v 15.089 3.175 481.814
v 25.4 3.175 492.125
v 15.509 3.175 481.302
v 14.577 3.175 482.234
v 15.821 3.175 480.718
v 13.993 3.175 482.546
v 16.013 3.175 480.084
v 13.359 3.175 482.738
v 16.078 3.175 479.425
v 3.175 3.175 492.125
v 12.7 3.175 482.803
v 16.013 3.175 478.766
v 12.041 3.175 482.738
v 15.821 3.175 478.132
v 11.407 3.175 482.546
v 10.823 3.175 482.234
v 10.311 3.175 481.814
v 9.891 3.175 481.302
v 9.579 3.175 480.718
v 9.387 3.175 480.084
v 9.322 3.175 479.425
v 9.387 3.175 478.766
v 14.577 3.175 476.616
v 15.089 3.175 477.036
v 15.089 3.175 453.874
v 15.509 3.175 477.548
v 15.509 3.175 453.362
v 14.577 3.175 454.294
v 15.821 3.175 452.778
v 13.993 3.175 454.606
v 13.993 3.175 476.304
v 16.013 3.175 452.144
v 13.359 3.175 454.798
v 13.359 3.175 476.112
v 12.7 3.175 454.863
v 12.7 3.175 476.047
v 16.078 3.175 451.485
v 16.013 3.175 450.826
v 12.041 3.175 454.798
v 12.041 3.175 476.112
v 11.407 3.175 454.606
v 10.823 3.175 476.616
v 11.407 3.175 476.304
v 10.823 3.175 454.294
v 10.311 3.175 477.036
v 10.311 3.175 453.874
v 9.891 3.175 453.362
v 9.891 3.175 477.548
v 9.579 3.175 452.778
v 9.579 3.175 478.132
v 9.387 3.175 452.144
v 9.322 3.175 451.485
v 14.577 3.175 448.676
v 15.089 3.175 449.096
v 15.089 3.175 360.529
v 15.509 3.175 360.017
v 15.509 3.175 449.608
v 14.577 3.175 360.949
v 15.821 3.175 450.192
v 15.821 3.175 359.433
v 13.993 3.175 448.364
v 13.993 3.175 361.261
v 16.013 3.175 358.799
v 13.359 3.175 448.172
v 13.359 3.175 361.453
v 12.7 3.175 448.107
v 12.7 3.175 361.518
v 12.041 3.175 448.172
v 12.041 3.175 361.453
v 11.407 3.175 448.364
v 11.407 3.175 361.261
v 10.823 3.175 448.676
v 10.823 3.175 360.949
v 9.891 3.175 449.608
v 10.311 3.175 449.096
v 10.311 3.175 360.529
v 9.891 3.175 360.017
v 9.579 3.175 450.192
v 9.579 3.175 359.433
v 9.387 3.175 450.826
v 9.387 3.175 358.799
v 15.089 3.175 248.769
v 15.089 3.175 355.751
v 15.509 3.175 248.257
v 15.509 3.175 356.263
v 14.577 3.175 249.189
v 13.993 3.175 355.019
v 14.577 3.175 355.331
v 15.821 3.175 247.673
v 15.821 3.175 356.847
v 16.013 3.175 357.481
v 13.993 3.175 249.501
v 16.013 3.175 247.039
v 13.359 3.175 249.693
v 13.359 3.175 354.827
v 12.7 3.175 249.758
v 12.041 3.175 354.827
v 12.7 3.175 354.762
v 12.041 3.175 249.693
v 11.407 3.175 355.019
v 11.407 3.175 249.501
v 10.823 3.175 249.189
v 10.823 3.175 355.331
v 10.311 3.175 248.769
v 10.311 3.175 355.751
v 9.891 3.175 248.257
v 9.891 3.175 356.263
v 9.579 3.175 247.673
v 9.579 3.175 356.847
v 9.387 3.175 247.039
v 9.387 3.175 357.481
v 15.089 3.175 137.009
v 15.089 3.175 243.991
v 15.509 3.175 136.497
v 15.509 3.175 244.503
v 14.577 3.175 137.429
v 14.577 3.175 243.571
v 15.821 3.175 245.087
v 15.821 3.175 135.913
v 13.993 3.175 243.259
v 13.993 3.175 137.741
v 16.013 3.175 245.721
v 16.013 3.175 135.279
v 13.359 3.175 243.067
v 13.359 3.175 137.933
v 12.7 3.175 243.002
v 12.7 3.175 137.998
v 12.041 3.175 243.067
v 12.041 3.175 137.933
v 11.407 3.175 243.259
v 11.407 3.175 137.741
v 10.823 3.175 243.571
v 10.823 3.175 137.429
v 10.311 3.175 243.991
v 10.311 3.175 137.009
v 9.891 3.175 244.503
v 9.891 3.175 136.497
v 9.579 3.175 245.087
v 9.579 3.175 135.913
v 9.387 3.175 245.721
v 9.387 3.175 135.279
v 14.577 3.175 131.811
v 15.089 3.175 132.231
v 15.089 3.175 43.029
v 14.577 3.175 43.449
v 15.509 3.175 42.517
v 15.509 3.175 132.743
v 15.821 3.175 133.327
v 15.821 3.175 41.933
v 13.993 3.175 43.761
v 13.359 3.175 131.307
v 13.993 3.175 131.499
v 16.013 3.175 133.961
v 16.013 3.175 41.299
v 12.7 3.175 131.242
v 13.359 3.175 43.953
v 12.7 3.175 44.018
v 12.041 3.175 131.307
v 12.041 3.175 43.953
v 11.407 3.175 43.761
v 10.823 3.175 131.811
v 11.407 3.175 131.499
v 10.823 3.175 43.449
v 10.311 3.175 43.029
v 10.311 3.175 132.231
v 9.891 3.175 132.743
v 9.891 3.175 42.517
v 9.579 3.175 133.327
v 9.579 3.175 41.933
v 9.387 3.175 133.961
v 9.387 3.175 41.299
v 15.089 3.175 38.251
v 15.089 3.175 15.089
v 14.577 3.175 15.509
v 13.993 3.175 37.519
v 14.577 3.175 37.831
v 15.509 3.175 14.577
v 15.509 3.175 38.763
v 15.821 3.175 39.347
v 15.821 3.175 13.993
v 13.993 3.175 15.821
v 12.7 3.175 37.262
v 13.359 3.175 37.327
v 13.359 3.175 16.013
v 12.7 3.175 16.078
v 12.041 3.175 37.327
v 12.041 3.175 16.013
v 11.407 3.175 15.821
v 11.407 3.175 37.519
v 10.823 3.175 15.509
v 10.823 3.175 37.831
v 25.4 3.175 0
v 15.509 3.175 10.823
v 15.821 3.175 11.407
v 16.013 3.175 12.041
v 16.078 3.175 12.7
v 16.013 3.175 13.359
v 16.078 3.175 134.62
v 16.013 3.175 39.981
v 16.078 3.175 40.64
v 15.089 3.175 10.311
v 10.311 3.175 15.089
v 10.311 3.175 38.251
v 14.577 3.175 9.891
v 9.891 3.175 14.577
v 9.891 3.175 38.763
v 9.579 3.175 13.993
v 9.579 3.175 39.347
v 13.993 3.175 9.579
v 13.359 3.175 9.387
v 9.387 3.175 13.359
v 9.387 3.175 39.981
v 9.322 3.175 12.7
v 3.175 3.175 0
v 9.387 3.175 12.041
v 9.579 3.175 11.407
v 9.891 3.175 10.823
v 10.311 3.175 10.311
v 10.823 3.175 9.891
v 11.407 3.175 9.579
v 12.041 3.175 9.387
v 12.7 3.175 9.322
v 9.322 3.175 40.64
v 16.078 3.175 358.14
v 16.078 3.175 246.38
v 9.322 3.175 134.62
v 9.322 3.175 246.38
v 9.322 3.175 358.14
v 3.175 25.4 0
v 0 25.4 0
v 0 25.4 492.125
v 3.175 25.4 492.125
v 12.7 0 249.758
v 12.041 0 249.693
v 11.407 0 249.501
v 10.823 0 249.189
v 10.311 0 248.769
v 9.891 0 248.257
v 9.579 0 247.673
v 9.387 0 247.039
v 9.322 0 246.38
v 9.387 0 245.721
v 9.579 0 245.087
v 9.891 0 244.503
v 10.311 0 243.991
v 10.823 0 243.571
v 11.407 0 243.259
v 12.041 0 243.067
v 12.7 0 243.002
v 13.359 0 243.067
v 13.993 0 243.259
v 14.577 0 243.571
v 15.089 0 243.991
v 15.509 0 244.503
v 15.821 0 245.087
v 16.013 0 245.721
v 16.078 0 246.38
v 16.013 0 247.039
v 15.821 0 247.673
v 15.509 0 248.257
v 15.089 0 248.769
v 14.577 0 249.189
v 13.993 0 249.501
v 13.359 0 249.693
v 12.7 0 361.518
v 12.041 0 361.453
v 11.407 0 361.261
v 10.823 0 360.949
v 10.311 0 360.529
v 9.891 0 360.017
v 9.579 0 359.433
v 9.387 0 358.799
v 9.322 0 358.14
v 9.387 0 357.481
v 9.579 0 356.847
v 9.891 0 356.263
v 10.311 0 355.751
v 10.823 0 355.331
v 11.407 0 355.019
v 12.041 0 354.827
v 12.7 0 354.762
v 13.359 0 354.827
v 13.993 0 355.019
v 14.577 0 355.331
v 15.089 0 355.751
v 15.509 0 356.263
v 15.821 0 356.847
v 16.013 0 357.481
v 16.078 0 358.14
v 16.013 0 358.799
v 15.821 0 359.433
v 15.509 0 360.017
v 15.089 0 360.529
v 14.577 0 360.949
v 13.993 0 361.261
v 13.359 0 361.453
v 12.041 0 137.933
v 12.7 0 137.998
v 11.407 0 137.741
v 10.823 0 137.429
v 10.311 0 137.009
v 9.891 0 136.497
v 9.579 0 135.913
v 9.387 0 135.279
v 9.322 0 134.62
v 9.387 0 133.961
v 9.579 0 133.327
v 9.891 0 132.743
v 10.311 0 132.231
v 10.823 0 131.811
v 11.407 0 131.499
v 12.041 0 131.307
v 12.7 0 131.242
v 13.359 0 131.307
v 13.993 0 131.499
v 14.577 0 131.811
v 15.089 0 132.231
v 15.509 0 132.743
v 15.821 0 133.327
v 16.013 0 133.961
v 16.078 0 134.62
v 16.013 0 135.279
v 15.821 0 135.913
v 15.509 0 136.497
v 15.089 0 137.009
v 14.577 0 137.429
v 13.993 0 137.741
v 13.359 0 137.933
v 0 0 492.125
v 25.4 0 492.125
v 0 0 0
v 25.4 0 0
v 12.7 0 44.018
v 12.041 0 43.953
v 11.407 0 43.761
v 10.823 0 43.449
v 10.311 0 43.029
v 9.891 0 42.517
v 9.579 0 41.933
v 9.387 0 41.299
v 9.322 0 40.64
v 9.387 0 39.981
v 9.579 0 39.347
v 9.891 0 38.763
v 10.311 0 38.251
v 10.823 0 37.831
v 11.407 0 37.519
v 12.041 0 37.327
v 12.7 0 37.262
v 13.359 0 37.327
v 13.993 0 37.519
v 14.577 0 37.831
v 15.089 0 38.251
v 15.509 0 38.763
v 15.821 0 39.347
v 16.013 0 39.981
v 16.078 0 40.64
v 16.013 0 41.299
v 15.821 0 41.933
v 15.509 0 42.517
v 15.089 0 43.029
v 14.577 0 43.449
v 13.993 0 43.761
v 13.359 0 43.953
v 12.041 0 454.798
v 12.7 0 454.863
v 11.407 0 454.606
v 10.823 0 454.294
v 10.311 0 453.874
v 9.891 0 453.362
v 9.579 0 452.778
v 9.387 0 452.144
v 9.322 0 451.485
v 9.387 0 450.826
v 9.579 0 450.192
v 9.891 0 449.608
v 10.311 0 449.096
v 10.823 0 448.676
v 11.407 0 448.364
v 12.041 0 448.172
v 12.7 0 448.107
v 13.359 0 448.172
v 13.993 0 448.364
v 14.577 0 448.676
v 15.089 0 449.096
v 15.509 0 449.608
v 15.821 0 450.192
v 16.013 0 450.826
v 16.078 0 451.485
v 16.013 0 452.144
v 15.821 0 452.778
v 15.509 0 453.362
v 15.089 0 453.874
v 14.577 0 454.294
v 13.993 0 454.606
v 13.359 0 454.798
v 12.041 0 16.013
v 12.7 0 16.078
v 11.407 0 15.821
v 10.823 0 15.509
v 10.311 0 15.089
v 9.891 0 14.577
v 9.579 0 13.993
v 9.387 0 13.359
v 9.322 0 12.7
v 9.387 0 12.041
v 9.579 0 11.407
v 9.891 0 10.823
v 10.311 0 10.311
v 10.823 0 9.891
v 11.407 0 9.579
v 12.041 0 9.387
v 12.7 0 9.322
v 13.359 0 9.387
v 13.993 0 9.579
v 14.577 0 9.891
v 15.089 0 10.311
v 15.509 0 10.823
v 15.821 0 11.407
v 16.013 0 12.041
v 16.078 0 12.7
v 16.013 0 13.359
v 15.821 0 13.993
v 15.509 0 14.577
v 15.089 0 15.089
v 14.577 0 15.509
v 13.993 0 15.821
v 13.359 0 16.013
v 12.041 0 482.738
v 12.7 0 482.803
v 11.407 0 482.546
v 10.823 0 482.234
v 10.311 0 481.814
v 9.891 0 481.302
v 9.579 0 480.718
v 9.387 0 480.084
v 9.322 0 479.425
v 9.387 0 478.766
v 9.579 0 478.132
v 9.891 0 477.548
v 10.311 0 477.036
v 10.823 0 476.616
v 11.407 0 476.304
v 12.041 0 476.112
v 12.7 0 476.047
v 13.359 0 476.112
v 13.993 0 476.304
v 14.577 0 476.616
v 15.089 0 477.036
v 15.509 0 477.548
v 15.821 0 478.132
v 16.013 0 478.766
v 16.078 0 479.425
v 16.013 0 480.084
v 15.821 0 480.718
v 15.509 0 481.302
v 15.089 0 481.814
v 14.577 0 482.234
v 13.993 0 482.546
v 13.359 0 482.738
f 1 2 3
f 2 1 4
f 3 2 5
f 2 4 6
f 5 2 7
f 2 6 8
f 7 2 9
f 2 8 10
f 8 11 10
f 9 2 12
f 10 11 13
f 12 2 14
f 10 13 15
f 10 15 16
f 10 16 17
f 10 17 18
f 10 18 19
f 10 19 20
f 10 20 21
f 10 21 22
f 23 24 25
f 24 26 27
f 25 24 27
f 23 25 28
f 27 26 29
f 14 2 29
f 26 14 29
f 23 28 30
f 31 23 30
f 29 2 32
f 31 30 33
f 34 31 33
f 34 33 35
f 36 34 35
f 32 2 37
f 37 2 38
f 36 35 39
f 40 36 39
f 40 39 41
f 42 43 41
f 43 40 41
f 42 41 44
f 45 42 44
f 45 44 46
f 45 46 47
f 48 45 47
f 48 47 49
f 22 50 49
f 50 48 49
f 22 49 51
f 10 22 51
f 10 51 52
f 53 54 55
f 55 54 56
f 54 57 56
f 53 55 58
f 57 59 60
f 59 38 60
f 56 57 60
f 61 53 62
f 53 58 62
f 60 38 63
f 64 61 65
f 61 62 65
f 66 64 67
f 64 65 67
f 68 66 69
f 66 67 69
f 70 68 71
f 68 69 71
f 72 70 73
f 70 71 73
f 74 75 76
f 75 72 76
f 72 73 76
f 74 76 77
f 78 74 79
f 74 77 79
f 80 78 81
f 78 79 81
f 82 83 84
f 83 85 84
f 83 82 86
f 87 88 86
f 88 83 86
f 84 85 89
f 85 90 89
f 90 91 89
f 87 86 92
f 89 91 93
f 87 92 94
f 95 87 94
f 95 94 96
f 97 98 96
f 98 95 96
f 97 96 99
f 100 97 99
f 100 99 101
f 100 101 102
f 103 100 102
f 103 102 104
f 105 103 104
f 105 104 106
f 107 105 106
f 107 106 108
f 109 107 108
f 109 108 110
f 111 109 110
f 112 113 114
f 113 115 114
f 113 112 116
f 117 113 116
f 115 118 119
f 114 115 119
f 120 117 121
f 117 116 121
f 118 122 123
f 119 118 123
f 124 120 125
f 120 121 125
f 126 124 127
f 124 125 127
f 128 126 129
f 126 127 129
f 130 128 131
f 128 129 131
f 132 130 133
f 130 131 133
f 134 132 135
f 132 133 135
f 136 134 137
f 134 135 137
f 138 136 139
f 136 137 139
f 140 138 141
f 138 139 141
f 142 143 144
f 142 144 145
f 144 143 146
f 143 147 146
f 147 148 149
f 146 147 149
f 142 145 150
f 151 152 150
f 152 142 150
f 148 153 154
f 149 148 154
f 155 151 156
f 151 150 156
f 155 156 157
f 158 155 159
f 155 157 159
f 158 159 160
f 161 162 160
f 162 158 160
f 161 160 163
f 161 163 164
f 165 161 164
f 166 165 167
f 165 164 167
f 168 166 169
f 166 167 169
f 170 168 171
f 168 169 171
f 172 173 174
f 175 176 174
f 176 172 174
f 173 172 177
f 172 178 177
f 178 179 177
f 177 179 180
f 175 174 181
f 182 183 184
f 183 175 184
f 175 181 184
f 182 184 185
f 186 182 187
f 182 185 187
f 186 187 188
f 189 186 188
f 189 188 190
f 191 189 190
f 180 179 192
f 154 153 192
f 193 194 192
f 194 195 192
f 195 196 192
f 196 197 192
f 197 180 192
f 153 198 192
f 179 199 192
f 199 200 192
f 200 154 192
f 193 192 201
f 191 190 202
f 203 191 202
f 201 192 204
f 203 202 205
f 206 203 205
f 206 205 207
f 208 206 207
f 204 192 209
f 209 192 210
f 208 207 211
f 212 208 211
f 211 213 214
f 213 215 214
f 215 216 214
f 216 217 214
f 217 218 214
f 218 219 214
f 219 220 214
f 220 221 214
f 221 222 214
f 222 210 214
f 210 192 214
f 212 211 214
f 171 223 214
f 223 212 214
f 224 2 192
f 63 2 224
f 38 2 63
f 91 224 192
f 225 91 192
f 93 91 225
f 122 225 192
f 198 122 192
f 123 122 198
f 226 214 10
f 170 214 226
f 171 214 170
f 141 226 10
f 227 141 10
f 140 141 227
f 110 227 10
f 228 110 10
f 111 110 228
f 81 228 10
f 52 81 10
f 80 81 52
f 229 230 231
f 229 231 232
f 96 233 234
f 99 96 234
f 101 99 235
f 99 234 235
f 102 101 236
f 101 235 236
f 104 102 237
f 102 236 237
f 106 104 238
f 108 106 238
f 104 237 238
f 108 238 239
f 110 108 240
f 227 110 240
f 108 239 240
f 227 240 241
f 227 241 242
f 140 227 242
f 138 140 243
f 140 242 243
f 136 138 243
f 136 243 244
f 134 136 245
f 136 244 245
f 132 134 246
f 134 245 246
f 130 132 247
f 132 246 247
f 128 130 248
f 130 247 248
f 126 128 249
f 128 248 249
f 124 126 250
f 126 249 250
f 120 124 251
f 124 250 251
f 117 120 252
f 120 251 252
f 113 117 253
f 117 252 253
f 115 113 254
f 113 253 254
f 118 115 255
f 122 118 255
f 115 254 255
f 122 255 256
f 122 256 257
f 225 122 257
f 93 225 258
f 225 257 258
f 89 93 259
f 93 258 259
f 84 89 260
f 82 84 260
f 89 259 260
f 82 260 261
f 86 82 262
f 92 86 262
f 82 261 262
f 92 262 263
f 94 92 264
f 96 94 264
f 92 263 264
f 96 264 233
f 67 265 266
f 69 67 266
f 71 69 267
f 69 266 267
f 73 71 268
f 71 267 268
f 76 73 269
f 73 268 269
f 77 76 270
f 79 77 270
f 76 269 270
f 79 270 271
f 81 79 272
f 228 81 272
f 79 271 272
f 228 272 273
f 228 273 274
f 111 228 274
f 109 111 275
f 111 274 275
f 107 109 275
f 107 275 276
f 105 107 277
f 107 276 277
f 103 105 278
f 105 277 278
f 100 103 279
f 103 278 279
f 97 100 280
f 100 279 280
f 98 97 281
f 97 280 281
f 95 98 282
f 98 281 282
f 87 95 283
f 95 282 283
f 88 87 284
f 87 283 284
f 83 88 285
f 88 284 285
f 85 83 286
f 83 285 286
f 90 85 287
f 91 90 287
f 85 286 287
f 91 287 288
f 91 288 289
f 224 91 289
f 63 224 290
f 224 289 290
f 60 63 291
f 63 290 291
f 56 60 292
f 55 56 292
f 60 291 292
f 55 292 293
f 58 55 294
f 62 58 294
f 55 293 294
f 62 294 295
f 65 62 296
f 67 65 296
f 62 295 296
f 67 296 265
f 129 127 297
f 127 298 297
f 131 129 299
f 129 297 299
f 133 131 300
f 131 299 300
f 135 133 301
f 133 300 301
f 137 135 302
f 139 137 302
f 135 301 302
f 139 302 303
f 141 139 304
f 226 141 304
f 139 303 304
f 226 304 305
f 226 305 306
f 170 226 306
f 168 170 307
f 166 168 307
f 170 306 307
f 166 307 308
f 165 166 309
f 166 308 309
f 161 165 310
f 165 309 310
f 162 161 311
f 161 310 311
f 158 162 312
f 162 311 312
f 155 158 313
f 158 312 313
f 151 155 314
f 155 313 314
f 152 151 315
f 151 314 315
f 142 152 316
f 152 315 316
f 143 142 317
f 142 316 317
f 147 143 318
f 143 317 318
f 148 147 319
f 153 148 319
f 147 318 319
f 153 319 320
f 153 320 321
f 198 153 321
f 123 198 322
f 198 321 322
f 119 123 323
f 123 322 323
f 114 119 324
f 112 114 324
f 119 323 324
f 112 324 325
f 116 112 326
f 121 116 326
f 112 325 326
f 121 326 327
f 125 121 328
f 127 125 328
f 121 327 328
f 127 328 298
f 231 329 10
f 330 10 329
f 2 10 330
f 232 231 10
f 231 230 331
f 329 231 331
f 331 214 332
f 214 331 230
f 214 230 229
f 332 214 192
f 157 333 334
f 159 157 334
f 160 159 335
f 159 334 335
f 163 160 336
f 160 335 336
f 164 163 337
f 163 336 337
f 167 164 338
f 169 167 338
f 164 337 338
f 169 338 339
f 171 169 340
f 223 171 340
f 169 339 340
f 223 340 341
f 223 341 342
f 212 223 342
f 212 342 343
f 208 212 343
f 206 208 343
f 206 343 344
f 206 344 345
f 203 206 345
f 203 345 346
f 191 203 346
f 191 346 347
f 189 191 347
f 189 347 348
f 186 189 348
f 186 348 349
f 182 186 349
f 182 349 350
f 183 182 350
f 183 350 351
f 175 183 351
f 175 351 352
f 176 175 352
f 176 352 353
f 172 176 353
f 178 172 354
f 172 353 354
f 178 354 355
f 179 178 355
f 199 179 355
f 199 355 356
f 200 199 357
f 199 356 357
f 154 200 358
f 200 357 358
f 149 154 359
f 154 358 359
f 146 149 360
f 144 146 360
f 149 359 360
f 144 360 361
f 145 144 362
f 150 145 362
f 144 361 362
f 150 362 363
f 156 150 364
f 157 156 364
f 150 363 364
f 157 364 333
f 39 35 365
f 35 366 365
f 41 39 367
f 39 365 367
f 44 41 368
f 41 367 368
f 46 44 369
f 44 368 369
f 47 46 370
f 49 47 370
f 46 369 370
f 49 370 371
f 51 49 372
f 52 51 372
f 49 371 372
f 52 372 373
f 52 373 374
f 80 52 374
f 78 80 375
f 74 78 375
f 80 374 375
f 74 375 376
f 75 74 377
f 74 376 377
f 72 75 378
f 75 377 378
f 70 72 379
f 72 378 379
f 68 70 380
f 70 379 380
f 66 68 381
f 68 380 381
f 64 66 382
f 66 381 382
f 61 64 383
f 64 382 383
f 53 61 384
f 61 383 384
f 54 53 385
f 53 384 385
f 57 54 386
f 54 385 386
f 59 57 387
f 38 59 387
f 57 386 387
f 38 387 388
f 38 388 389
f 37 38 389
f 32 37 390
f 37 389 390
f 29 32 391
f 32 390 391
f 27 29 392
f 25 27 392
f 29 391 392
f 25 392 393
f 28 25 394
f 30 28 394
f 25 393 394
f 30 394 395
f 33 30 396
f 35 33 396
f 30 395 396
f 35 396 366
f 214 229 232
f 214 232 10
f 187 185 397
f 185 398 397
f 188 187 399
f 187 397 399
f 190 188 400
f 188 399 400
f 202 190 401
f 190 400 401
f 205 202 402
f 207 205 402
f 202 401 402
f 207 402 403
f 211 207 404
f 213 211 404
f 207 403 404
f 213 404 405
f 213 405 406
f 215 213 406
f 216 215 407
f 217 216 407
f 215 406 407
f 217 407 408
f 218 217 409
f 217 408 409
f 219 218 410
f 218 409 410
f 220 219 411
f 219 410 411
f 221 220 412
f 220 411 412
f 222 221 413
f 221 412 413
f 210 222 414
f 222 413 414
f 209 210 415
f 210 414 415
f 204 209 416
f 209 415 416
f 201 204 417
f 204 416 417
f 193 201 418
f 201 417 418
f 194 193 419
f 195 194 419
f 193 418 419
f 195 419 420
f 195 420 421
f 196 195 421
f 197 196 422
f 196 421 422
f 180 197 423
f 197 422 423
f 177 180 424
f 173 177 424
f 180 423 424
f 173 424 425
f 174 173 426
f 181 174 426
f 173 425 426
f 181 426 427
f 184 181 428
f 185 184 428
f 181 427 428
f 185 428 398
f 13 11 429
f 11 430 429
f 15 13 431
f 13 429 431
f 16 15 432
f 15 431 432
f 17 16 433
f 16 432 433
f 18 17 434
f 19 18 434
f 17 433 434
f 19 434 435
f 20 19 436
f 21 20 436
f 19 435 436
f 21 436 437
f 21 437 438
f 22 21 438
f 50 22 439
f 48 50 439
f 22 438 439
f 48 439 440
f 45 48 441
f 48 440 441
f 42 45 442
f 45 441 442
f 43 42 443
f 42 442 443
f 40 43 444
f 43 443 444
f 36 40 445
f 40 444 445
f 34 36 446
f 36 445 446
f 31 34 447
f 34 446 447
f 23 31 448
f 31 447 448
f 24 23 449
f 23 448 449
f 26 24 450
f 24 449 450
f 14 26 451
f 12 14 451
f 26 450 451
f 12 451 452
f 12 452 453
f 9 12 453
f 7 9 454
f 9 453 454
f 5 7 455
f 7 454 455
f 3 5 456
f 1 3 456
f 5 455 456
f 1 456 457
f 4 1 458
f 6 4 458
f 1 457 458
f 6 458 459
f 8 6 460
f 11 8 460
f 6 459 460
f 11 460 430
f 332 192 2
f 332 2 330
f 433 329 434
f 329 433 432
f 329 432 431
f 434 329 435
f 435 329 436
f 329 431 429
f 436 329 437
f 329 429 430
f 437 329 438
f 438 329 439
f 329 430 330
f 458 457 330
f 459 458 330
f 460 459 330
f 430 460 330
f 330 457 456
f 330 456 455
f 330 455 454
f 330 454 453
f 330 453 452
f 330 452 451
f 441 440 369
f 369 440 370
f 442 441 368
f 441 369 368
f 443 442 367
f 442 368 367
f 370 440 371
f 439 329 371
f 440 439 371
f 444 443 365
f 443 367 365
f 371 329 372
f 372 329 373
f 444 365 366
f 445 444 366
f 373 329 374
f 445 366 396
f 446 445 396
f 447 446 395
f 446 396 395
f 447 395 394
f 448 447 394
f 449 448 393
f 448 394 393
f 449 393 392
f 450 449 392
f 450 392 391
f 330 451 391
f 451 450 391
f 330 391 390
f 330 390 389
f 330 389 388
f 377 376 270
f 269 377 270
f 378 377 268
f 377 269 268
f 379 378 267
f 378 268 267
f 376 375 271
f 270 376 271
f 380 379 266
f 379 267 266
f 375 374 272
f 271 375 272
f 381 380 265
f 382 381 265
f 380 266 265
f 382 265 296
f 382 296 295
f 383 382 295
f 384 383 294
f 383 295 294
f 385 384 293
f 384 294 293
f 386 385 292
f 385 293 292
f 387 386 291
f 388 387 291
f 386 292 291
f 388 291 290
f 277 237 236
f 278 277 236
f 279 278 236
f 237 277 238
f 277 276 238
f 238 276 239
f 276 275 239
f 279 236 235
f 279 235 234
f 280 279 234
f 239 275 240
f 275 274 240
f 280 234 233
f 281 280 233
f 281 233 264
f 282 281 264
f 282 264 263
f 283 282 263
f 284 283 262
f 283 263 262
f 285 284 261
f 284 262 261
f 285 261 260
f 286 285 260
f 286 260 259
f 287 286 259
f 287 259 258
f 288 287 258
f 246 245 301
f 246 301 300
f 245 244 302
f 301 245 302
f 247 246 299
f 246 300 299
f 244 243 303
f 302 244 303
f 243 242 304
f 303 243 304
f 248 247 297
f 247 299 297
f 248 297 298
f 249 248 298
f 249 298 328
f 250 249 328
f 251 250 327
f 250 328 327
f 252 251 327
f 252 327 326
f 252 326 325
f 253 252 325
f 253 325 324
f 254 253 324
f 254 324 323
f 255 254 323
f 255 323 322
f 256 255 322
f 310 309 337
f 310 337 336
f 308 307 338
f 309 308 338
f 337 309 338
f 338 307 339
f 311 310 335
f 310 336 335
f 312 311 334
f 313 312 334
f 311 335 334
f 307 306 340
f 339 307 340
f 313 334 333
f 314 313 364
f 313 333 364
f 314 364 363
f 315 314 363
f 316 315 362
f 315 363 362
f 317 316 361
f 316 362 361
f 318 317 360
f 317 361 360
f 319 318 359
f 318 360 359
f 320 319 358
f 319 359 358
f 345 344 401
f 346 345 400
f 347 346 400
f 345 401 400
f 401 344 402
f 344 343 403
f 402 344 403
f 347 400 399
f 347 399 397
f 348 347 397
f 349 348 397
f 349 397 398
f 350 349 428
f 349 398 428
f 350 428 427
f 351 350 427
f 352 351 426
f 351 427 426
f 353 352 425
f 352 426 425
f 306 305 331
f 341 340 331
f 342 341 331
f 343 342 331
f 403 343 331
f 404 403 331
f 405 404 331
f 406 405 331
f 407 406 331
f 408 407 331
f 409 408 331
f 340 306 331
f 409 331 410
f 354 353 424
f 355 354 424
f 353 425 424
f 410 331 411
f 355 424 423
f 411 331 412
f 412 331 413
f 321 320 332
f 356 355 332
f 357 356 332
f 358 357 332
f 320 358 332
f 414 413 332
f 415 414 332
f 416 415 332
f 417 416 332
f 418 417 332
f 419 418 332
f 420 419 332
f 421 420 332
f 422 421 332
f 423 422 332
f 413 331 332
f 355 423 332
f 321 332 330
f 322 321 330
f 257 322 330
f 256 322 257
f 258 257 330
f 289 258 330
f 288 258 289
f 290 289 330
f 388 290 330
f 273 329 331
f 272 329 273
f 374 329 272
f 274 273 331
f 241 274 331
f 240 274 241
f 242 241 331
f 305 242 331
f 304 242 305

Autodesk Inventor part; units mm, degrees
ref_plane "YZ Plane" through (0, 0, 0) normal (1, 0, 0) x (0, 1, 0)
ref_plane "XZ Plane" through (0, 0, 0) normal (0, 1, 0) x (-1, 0, 0)
ref_plane "XY Plane" through (0, 0, 0) normal (0, 0, 1) x (1, 0, 0)
sketch "Sketch1" plane through (0, 0, 0) normal (0, 0, 1) x (1, 0, 0)
  line L0 (0, 25.4) -> (0, 0)
  line L1 (0, 0) -> (25.4, 0)
  line L2 (3.175, 25.4) -> (3.175, 4.953)
  line L3 (4.953, 3.175) -> (25.4, 3.175)
  line L4 (0, 25.4) -> (3.175, 25.4)
  line L5 (25.4, 3.175) -> (25.4, 0)
  line L6 (3.175, 4.953) -> (3.175, 3.175)
  line L7 (4.953, 3.175) -> (3.175, 3.175)
  dimension "d0" = 25.4
  dimension "d1" = 25.4
  dimension "d2" = 3.175
extrude "Extrusion1" add sketch "Sketch1" along normal blind 492.125
sketch "Sketch2" plane through (3.175, 3.175, 0) normal (0, 1, 0) x (1, 0, 0)
  circle A0 centre (9.525, -479.425) radius 2.8398
  line L0 (22.225, -492.125) -> (0, -492.125) projected
  line L1 (22.225, 0) -> (22.225, -492.125) projected
  circle A1 centre (9.525, -12.7) radius 2.8398
  line L2 (22.225, 0) -> (0, 0) projected
  point P0 (-3.175, 0)
  point P1 (1.778, -492.125)
  point P2 (1.778, 0)
  dimension "d5" = 12.7
  dimension "d6" = 12.7
  dimension "d9" = 466.725
  dimension "d31" = 12.7
hole "Hole1" at (12.7, 3.175, 479.425) at (12.7, 3.175, 12.7) direction (0, -1, 0) diameter 6.7564 depth 25.4 tip angle 118 clearance for "Flat Head Machine Screw (82)" size "1/4" standard "Ansi Unified Screw Threads"
sketch "Sketch8" plane through (3.175, 3.175, 0) normal (0, 1, 0) x (1, 0, 0)
  circle A0 centre (9.525, -451.485) radius 5.9545
  line L0 (22.225, 0) -> (22.225, -492.125) projected
  line L1 (22.225, -492.125) -> (0, -492.125) projected
  point P0 (-3.175, 0)
  dimension "d59" = 12.7
  dimension "d60" = 40.64
hole "Hole5" at (12.7, 3.175, 451.485) direction (0, -1, 0) diameter 6.7564 depth 25.4 tip angle 118 clearance for "Flat Head Machine Screw (82)" size "1/4" standard "Ansi Unified Screw Threads"
sketch "Sketch9" plane through (3.175, 3.175, 0) normal (0, 1, 0) x (1, 0, 0)
  circle A0 centre (9.525, -40.64) radius 2.391
  line L0 (22.225, 0) -> (22.225, -492.125) projected
  line L1 (22.225, 0) -> (0, 0) projected
  point P0 (-3.175, 0)
  dimension "d68" = 12.7
  dimension "d69" = 40.64
hole "Hole6" at (12.7, 3.175, 40.64) direction (0, -1, 0) diameter 6.7564 depth 25.4 tip angle 118 clearance for "Flat Head Machine Screw (82)" size "1/4" standard "Ansi Unified Screw Threads"
sketch "Sketch10" plane through (3.175, 3.175, 0) normal (0, 1, 0) x (1, 0, 0)
  circle A0 centre (9.525, -134.62) radius 3.9264
  line L0 (22.225, 0) -> (22.225, -492.125) projected
  line L1 (22.225, 0) -> (0, 0) projected
  circle A1 centre (9.525, -246.38) radius 3.9264
  circle A2 centre (9.525, -358.14) radius 3.9264
  point P0 (-3.175, 0)
  dimension "d77" = 12.7
  dimension "d78" = 134.62
  dimension "d81" = 111.76
hole "Hole7" at (12.7, 3.175, 134.62) at (12.7, 3.175, 246.38) at (12.7, 3.175, 358.14) direction (0, -1, 0) diameter 6.7564 depth 25.4 tip angle 118 clearance for "Flat Head Machine Screw (82)" size "1/4" standard "Ansi Unified Screw Threads"
